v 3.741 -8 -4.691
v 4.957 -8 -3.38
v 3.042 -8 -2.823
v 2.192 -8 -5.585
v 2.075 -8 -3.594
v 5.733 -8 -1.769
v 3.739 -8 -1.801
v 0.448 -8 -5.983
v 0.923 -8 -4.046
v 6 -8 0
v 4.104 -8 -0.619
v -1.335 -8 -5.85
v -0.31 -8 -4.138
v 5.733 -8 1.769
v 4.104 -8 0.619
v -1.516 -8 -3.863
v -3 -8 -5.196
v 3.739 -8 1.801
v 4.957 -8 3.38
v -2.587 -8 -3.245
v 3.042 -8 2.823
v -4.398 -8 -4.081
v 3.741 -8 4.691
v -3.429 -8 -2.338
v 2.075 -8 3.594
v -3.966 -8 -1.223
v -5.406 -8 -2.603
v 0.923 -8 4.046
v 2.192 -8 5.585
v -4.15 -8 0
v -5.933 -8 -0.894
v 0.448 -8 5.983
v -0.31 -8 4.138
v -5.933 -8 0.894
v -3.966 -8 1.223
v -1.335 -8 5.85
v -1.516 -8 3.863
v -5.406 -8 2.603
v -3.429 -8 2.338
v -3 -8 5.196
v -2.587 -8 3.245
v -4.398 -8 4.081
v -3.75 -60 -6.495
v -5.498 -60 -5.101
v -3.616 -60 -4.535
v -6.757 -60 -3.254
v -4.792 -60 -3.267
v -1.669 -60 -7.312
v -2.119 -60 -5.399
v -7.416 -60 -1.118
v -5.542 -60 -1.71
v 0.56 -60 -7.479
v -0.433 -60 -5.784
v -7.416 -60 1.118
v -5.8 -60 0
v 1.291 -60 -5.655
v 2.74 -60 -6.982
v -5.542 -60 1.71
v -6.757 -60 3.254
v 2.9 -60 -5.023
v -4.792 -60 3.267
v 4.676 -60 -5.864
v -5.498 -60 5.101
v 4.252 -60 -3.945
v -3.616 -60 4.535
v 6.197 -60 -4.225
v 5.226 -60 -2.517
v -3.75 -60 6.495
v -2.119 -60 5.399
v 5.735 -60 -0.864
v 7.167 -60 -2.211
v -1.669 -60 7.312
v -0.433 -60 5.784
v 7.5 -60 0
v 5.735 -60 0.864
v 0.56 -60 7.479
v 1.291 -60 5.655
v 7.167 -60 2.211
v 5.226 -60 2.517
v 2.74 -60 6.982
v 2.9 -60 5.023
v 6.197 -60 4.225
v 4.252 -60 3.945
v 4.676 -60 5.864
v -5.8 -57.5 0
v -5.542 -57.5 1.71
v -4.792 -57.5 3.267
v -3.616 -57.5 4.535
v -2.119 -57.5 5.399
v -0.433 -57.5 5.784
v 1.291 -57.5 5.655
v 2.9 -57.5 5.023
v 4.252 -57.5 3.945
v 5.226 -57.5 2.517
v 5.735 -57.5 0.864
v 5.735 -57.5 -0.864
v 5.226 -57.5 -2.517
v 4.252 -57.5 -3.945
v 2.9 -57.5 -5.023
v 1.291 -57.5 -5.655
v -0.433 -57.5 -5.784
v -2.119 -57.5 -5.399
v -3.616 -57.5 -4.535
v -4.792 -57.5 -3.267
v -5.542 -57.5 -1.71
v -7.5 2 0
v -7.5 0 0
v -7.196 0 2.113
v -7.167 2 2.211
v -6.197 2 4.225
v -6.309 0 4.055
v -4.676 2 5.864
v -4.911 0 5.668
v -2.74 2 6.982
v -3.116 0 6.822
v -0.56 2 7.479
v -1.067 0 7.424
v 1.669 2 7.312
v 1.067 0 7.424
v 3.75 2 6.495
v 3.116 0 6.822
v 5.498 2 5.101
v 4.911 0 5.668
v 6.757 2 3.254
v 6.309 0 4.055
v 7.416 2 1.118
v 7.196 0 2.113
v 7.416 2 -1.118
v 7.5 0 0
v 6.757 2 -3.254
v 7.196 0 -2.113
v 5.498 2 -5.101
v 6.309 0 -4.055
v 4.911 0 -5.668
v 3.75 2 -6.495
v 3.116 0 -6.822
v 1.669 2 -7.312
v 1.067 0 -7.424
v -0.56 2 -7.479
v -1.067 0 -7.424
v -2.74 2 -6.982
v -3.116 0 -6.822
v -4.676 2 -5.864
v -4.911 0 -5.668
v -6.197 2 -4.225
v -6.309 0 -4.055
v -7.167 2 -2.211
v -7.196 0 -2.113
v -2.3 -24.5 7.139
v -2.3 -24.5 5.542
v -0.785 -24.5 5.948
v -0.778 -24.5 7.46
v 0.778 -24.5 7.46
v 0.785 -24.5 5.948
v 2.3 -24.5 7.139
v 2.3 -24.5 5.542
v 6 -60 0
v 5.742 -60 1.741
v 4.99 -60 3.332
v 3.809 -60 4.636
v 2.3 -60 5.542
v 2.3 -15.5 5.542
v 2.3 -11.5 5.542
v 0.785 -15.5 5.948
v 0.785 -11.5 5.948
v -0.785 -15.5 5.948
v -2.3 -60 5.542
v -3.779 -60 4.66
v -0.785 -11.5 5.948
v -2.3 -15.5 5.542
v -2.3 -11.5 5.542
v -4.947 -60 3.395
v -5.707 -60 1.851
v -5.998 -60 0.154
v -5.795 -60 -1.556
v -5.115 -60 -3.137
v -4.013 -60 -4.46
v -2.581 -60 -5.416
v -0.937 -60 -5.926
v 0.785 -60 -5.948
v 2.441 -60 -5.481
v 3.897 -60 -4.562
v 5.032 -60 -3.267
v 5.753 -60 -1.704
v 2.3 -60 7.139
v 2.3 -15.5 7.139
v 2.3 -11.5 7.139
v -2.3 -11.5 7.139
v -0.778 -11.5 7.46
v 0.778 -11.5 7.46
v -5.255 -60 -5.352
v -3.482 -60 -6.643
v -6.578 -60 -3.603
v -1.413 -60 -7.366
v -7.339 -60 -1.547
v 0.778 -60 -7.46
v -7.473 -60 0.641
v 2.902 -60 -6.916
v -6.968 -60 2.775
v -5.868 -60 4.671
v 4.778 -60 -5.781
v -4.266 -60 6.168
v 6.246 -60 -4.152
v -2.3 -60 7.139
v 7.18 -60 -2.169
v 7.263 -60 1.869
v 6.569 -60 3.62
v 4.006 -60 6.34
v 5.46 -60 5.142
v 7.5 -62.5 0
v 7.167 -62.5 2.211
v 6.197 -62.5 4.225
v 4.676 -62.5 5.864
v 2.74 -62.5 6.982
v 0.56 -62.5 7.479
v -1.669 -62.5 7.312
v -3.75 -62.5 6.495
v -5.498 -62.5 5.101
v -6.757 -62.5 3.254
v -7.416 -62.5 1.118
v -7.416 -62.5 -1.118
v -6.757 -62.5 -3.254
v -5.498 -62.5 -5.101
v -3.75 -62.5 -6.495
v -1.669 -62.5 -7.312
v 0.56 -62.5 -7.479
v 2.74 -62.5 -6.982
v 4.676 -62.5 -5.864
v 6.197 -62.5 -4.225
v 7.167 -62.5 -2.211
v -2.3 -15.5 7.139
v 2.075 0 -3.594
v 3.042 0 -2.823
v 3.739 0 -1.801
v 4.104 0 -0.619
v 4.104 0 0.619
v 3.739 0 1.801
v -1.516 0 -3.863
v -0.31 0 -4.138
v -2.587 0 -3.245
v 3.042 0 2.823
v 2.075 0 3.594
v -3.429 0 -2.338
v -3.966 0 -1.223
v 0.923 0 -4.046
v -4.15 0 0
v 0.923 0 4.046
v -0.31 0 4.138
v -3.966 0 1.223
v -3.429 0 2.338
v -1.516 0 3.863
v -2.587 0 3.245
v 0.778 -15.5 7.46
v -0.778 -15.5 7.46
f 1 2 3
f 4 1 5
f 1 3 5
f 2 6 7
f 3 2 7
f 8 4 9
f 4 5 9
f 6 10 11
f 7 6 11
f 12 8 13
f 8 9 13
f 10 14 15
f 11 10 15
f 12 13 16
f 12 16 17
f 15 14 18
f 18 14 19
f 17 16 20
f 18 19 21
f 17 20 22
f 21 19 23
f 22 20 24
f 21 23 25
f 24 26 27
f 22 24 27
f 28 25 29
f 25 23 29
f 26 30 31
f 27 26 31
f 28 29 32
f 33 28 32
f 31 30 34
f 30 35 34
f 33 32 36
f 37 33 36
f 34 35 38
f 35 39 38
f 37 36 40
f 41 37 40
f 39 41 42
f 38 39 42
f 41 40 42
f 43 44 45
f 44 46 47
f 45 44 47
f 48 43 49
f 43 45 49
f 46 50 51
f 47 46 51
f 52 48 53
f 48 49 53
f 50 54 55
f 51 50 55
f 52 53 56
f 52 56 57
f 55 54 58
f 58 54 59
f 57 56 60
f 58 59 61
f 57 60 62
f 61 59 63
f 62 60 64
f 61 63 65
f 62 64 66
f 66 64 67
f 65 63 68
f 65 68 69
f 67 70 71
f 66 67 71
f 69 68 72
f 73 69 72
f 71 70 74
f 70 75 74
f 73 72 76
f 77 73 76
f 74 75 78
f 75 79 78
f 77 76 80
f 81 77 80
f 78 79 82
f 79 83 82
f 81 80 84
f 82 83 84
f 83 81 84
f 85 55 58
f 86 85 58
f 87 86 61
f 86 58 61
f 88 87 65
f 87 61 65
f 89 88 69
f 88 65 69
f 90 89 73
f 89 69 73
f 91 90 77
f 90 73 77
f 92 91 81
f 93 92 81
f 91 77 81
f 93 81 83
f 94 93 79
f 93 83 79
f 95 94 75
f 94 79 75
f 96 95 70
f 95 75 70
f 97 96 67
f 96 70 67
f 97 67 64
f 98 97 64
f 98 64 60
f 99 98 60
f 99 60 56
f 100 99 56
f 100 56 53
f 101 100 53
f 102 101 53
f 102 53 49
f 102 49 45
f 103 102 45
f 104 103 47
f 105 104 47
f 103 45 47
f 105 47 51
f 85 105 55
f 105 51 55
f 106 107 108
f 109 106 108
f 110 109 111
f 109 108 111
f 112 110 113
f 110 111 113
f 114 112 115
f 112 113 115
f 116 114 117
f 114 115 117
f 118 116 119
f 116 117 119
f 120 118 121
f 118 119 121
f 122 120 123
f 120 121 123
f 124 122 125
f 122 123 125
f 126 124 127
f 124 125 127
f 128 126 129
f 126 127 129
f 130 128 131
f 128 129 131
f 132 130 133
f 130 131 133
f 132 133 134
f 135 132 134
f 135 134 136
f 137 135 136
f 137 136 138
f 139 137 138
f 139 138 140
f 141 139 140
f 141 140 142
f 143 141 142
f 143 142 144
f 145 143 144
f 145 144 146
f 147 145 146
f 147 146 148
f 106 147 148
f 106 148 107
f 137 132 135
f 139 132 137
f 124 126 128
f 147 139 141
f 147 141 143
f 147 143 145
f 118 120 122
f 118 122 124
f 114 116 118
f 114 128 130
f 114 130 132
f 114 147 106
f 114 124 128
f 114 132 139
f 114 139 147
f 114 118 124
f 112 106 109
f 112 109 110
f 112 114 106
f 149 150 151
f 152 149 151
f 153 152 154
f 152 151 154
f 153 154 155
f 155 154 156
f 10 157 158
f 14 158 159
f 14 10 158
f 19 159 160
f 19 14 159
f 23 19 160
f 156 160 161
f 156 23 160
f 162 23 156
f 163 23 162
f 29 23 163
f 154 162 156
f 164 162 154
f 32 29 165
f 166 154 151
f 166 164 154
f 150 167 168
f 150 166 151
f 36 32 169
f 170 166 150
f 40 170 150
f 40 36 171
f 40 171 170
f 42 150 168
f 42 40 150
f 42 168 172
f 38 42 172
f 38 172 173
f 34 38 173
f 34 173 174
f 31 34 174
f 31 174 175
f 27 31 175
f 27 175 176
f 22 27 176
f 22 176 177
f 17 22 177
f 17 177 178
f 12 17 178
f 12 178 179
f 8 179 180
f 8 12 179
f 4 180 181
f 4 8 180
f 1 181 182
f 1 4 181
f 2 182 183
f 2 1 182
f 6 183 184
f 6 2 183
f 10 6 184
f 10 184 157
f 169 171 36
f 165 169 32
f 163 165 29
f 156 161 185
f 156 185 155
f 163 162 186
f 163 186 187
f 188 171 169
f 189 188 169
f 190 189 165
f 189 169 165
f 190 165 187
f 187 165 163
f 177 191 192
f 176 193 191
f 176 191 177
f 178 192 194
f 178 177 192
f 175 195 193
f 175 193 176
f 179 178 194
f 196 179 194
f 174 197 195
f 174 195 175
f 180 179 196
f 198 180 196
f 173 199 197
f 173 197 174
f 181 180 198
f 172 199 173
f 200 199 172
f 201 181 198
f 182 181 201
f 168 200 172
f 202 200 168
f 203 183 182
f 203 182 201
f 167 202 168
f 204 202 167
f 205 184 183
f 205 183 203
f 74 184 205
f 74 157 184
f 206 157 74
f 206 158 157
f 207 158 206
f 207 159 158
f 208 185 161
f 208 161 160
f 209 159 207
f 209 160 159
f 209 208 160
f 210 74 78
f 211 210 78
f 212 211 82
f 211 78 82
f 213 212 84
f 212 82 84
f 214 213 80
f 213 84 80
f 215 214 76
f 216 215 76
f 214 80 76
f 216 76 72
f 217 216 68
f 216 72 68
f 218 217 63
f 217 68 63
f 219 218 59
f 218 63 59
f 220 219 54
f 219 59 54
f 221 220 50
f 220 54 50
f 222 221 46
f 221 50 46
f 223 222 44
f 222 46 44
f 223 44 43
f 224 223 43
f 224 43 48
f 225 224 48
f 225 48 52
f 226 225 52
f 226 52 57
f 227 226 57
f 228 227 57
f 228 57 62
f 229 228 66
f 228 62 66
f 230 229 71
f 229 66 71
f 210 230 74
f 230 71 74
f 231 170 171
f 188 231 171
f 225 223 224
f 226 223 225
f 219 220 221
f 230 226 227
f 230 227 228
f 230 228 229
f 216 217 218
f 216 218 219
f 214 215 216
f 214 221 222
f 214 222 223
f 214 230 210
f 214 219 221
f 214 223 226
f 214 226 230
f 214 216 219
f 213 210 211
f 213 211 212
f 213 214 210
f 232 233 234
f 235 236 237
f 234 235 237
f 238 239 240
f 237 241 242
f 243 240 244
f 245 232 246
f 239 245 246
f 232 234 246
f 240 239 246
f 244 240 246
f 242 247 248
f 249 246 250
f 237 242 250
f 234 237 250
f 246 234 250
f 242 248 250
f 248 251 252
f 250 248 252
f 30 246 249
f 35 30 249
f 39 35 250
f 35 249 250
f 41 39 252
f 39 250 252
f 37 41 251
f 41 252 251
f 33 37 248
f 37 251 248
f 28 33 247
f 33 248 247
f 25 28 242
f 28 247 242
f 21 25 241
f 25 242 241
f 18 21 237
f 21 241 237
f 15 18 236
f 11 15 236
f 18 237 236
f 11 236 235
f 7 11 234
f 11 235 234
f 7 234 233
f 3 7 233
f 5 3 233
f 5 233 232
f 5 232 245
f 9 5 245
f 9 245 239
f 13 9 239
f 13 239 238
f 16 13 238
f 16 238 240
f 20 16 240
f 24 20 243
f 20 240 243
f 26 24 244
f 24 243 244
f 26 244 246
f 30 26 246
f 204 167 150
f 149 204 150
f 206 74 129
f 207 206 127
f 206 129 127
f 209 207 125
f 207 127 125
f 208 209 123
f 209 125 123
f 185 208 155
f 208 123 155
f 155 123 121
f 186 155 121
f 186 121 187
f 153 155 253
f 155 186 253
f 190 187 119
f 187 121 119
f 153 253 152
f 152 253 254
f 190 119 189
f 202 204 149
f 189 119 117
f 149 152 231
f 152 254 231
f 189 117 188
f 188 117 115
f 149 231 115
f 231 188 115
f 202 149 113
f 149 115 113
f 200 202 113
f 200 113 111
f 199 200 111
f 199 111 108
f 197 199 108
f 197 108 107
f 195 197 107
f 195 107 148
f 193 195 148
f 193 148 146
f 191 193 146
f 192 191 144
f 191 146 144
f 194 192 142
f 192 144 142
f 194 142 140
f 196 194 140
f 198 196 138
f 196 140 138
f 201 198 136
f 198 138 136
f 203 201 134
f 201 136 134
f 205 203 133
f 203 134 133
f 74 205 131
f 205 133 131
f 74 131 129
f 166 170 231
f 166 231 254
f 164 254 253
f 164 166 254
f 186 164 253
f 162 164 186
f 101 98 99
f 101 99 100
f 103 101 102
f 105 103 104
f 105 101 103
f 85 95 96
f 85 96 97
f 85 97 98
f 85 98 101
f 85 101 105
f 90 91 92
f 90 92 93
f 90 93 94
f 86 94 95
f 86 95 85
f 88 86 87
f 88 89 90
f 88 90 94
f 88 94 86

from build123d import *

# Parameters (mm, degrees)
F0_R      = 7.5
F0_R_2    = 6
F1_DEPTH  = 60
F2_R      = 6
F2_R_2    = 4.15
F3_DEPTH  = 8
F4_R      = 7.5
F5_DEPTH  = 2
F6_W      = 4.6
F6_H      = 65.5
F6_H_2    = 4
F7_DEPTH  = 25
F8_R      = 7.5
F9_DEPTH  = 2.5
F10_R     = 5.8
F11_DEPTH = 2.5


with BuildPart() as f1:
    # F0 (on Front) → F1 (new body)
    with BuildSketch(Plane.XZ):
        Circle(F0_R)
        Circle(F0_R_2, mode=Mode.SUBTRACT)
    extrude(amount=F1_DEPTH)

    # F2 (on face) → F3 (join)
    with BuildSketch(Plane(origin=(0, 0, 0), x_dir=(-1, 0, 0), z_dir=(0, 1, 0))):
        Circle(F2_R)
        Circle(F2_R_2, mode=Mode.SUBTRACT)
    extrude(amount=-F3_DEPTH)

    # F4 (on face) → F5 (join)
    with BuildSketch(Plane(origin=(0, 0, 0), x_dir=(-1, 0, 0), z_dir=(0, 1, 0))):
        Circle(F4_R)
    extrude(amount=F5_DEPTH)

    # F6 (on Top) → F7 (cut)
    with BuildSketch(Plane.XY):
        with Locations((0, -57.25)):
            Rectangle(F6_W, F6_H)
        with Locations((0, -13.5)):
            Rectangle(F6_W, F6_H_2)
    extrude(amount=F7_DEPTH, mode=Mode.SUBTRACT)


with BuildPart() as f9:
    # F8 (on face) → F9 (new body)
    with BuildSketch(Plane.XZ.offset(60)):
        Circle(F8_R)
    extrude(amount=F9_DEPTH)

    # F10 (on face) → F11 (join)
    with BuildSketch(Plane(origin=(0, -60, 0), x_dir=(-1, 0, 0), z_dir=(0, 1, 0))):
        Circle(F10_R)
    extrude(amount=F11_DEPTH)


solid = Compound([f1.part, f9.part])
